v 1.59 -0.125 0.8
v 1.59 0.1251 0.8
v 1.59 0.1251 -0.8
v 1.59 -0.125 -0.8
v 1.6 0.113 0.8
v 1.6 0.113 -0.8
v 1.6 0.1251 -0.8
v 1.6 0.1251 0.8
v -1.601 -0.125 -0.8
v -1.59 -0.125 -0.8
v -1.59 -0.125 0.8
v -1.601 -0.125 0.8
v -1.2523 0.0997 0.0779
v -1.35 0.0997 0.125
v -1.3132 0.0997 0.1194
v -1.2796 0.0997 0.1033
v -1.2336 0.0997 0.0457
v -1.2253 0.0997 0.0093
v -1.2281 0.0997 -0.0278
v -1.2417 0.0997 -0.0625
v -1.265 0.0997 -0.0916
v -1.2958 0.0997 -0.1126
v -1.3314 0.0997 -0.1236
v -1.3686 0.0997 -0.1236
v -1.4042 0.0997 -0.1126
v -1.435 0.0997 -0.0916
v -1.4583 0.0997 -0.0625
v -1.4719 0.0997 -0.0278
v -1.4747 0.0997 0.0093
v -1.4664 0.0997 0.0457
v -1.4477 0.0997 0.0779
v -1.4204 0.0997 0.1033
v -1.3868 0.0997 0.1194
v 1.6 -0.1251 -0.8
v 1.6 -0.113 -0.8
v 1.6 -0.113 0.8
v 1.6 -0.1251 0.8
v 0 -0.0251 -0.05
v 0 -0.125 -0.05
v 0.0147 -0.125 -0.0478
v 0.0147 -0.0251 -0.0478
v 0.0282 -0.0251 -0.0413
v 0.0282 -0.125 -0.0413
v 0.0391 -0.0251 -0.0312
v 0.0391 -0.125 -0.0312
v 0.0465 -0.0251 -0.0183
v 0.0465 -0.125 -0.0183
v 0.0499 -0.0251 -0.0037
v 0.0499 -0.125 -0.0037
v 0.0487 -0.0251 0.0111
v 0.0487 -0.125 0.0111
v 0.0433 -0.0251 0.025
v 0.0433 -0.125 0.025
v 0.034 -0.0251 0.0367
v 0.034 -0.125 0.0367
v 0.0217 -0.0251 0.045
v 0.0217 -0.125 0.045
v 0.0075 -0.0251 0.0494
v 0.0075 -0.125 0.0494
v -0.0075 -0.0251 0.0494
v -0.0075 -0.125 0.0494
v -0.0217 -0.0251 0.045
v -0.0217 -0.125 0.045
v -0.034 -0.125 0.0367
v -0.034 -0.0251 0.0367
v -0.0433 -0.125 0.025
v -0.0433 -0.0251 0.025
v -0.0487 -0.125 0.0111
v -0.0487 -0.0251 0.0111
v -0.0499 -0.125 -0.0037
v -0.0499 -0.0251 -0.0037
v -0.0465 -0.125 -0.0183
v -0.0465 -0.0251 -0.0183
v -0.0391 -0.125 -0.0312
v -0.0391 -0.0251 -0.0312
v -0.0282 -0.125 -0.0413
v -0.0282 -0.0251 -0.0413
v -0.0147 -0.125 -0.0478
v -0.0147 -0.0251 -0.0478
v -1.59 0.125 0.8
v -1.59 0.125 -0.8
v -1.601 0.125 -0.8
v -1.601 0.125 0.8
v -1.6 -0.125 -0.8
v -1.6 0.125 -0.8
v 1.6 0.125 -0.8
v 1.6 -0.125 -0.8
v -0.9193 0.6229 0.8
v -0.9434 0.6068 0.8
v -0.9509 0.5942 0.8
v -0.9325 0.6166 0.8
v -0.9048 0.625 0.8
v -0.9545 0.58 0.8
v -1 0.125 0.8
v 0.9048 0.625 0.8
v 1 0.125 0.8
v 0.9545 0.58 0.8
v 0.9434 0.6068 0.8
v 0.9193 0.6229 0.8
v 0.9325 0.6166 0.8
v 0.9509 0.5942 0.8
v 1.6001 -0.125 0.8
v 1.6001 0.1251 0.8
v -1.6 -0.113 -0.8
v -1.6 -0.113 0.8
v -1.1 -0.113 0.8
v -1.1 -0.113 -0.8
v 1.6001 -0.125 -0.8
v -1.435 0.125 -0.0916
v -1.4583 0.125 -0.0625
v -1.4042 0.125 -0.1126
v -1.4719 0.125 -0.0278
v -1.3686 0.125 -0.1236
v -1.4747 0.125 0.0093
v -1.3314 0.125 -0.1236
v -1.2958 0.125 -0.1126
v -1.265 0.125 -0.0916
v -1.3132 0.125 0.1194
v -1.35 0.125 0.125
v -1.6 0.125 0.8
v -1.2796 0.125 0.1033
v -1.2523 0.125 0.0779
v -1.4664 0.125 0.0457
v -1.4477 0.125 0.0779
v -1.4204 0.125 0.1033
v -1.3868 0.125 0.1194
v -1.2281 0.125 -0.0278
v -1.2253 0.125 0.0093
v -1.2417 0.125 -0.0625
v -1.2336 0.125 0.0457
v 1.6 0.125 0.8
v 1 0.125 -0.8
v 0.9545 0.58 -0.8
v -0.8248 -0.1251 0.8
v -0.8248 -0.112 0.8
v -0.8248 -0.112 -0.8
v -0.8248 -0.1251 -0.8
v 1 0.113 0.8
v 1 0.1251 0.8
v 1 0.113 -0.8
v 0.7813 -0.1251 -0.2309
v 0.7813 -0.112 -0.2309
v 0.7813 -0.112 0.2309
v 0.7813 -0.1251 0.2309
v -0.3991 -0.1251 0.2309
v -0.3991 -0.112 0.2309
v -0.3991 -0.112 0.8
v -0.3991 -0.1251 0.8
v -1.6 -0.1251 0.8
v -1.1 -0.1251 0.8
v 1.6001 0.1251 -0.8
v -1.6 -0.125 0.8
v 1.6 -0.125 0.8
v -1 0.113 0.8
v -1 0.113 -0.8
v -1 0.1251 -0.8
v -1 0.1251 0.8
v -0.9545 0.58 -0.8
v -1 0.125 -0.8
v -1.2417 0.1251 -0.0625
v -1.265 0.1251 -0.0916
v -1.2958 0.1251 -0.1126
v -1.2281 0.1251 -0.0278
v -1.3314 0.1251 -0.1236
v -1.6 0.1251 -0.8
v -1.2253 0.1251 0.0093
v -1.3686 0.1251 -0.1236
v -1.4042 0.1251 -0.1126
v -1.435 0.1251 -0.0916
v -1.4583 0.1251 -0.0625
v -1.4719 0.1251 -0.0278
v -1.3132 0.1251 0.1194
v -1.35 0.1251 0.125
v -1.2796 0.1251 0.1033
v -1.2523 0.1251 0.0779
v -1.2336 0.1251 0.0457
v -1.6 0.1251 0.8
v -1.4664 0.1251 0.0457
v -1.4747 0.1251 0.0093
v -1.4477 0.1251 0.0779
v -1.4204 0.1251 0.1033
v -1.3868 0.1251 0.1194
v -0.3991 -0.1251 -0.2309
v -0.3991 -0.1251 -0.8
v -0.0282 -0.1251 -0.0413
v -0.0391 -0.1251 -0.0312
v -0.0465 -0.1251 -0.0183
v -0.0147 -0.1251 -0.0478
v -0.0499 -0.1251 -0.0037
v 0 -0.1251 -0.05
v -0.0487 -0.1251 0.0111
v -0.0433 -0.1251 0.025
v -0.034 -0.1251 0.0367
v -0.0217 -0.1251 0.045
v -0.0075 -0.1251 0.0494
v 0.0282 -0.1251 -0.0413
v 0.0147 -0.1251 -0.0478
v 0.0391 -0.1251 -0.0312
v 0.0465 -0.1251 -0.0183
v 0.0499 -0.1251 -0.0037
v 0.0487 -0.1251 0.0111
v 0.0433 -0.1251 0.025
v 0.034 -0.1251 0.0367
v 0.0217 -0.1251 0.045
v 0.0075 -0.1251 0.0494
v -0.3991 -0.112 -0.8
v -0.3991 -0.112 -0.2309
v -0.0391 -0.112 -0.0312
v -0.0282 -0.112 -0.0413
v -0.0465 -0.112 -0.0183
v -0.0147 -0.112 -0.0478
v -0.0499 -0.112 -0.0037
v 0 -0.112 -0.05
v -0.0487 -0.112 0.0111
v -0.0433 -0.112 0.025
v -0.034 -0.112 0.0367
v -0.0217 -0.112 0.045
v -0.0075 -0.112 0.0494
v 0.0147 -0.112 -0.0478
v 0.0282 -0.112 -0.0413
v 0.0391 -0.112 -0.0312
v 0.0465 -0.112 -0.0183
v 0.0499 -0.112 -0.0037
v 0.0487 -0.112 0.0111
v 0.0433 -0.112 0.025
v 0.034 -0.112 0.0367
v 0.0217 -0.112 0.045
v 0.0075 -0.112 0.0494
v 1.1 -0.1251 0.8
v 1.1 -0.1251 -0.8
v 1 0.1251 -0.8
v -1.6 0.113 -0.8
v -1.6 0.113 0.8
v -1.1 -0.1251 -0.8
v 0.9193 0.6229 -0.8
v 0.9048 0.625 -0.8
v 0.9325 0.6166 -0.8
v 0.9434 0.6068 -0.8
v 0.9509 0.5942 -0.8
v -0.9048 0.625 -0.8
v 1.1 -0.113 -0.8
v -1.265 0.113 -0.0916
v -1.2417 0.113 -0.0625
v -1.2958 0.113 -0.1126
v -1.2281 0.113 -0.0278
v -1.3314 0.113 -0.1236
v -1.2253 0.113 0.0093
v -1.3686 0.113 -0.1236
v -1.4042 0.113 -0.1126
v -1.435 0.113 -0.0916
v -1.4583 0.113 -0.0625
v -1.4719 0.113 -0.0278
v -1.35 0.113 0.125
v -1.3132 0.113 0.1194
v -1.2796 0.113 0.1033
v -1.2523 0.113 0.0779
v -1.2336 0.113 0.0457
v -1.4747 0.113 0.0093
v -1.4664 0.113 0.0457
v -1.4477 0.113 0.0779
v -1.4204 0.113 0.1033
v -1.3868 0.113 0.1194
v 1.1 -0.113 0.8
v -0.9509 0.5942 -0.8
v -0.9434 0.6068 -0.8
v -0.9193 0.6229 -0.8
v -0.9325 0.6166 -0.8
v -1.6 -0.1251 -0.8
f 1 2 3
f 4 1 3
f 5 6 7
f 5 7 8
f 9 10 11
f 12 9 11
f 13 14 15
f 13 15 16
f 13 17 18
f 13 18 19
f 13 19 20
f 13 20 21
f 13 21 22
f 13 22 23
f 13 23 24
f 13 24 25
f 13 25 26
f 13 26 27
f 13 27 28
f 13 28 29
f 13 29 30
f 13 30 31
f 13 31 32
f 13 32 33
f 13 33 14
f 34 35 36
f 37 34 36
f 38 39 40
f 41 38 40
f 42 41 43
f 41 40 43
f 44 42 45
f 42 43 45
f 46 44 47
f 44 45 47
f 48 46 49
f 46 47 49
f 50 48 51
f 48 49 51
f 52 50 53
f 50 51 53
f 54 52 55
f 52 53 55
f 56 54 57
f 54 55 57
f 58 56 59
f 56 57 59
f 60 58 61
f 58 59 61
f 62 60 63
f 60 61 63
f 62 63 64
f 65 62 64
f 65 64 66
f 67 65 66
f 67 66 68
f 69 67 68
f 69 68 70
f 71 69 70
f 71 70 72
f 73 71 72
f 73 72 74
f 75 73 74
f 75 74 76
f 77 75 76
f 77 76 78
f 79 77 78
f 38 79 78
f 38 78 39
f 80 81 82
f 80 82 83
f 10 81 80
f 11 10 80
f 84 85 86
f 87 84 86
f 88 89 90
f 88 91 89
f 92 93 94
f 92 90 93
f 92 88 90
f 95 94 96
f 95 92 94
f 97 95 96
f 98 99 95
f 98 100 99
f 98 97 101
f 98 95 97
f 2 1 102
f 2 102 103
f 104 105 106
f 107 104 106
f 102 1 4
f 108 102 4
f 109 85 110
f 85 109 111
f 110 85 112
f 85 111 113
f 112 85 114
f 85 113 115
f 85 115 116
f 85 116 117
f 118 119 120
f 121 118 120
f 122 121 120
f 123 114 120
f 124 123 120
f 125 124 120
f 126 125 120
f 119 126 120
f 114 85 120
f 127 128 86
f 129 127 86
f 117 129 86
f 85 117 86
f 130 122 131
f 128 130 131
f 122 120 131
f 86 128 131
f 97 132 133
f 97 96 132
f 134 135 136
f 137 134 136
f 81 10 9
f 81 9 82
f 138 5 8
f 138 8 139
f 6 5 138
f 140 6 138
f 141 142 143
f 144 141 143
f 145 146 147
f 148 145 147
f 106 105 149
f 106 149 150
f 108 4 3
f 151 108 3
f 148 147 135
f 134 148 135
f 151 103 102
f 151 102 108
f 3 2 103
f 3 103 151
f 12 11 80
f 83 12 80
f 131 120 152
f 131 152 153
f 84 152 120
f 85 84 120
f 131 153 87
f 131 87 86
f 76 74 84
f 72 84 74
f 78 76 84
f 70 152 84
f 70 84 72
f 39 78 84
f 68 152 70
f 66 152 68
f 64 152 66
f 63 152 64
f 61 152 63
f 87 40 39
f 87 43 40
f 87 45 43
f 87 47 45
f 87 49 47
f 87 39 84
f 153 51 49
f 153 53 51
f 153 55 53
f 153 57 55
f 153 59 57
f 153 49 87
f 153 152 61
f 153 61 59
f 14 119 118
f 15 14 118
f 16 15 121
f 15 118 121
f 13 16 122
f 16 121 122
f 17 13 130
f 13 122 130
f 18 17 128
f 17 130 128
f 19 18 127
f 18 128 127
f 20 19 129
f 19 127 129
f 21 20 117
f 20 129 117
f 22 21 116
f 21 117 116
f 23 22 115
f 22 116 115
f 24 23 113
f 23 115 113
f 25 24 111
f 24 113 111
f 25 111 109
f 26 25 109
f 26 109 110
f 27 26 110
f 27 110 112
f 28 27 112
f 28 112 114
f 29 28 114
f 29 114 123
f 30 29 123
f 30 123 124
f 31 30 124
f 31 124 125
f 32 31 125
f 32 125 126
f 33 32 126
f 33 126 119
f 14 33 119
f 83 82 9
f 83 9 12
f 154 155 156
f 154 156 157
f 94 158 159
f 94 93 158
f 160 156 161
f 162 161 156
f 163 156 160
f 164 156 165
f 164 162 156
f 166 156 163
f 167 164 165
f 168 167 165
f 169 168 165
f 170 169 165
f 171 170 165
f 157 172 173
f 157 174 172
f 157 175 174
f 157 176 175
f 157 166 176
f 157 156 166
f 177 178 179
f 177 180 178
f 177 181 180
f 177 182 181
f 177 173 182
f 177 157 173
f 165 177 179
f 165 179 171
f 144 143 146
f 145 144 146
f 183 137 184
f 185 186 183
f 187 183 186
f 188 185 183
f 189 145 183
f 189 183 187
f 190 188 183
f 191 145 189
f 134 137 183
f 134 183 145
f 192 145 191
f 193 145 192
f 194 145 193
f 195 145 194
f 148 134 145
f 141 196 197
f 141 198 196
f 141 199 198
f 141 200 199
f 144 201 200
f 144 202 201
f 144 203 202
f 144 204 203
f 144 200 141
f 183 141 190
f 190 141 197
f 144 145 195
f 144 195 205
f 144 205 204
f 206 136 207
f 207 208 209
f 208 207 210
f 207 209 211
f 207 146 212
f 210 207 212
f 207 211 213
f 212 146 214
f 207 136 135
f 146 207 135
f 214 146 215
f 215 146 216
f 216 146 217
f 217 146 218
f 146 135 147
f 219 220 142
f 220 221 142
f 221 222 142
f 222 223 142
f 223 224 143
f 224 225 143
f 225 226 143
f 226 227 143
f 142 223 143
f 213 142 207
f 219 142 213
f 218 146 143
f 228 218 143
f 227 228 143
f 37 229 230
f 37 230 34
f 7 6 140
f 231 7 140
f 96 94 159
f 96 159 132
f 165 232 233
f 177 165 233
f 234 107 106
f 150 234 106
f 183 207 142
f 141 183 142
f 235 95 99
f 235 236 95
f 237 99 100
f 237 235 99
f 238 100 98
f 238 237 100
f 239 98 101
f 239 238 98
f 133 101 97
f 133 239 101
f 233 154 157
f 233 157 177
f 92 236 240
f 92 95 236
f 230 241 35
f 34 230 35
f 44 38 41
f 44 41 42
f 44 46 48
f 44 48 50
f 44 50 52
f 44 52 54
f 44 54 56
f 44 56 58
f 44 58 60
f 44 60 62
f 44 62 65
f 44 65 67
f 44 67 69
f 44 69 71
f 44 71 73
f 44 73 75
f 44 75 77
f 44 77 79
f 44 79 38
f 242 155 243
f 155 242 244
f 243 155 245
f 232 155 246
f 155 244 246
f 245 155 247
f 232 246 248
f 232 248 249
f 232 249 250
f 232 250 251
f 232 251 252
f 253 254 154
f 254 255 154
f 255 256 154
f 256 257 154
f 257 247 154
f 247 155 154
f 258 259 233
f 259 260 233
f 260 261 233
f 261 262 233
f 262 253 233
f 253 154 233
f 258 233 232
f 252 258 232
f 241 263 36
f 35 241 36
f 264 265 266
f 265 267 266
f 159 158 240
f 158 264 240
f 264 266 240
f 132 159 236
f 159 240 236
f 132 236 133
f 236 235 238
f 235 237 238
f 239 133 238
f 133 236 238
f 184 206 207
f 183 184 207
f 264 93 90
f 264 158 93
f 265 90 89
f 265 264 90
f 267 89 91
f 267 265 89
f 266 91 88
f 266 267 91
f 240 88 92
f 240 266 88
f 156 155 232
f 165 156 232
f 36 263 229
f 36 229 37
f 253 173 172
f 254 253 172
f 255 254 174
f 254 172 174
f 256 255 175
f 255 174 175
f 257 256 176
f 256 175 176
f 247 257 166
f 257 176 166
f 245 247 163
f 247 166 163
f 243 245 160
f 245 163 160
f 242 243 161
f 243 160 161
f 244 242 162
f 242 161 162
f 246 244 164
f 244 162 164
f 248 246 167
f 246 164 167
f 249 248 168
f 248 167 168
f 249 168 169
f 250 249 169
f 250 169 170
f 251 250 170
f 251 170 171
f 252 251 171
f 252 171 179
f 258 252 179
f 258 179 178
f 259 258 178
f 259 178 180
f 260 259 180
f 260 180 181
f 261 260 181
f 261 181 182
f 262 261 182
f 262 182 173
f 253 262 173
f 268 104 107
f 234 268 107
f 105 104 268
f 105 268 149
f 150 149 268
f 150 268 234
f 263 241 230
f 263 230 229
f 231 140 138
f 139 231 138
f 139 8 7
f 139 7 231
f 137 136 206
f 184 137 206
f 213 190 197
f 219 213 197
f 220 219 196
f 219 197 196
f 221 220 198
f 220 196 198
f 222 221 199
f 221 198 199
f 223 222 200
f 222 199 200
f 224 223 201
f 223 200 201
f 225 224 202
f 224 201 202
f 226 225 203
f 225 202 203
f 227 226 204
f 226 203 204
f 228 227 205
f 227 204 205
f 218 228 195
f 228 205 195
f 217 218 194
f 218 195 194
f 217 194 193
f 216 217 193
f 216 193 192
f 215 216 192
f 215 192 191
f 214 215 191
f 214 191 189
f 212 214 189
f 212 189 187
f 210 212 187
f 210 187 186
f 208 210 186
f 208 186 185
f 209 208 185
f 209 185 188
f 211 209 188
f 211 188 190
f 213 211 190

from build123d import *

# Parameters (mm, degrees)
SKETCH1_W                  = 3.2
SKETCH1_H                  = 0.25
EXTRUDE1_DEPTH             = 0.8
EXTRUDE2_DEPTH             = 0.8
EXTRUDE3_START             = -0.013
EXTRUDE3_DEPTH             = 0.0131
EXTRUDE4_DEPTH             = 0.0001
EXTRUDE4_DEPTH_BACK        = 0.012
SKETCH2_3_W                = 0.5
SKETCH2_3_H                = 1.6
EXTRUDE4_2_DEPTH           = 0.0001
EXTRUDE4_2_DEPTH_BACK      = 0.012
EXTRUDE5_DEPTH             = 0.0001
EXTRUDE5_DEPTH_BACK        = 0.012
SKETCH3_W                  = 0.6
SKETCH3_H                  = 1.6
EXTRUDE5_2_DEPTH           = 0.0001
EXTRUDE5_2_DEPTH_BACK      = 0.012
FILLET1_R                  = 0.05
EXTRUDE6_DEPTH             = 0.0001
EXTRUDE6_DEPTH_BACK        = 0.01
SKETCH5_W                  = 1.6
SKETCH5_H                  = 0.2501
EXTRUDE7_DEPTH             = 0.001
EXTRUDE7_DEPTH_BACK        = 0.01
SKETCH6_W                  = 1.6
SKETCH6_H                  = 0.25
SKETCH8_R                  = 0.05
EXTRUDE_PWB_LOCATION_DEPTH = 0.1
SKETCH9_R                  = 0.125
CUT_EXTRUDE2_DEPTH         = 0.0254


# Read off the part's stored shape, not the designer's step: Extrude3
with BuildPart() as part:
    # Sketch1 → Extrude1 (new, symmetric)
    with BuildSketch(Plane.XY):
        Rectangle(SKETCH1_W, SKETCH1_H)
    extrude(amount=EXTRUDE1_DEPTH, both=True)


with BuildPart() as body_2:
    # Sketch1<3> → Extrude2 (new, symmetric)
    with BuildSketch(Plane.XY):
        Polygon((-0.95, 0.625), (-1, 0.125), (1, 0.125), (0.95, 0.625), align=None)
    extrude(amount=EXTRUDE2_DEPTH, both=True)

    # Fillet1
    fillet1_edges = [body_2.edges().sort_by_distance(p)[0] for p in [
        (0.95, 0.625, 0),
        (-0.95, 0.625, 0),
    ]]
    fillet(fillet1_edges, radius=FILLET1_R)


with BuildPart() as body_3:
    # Extrude3 outline → Extrude3 (new body)
    with BuildSketch(Plane.XZ.offset(0.125).offset(EXTRUDE3_START)):
        Polygon((-0.399092971, 0.230883574), (-0.399092971, 0.8), (-0.824792139, 0.8), (-0.824792139, -0.8), (-0.399092971, -0.8), (-0.399092971, -0.230883574), (0.781254724, -0.230883574), (0.781254724, 0.230883574), align=None)
    extrude(amount=EXTRUDE3_DEPTH)


with BuildPart() as body_4:
    # Sketch2<3> → Extrude4 (new, two sides: drawn at the far end of the back side and taken through both)
    with BuildSketch(Plane.XZ.offset(0.125).offset(-EXTRUDE4_DEPTH_BACK)):
        with Locations((-1.35, 0)):
            Rectangle(SKETCH2_3_W, SKETCH2_3_H)
    extrude(amount=EXTRUDE4_DEPTH + EXTRUDE4_DEPTH_BACK)


with BuildPart() as body_5:
    # Sketch2<3> → Extrude4 2 (new, two sides: drawn at the far end of the back side and taken through both)
    with BuildSketch(Plane.XZ.offset(0.125).offset(-EXTRUDE4_2_DEPTH_BACK)):
        with Locations((1.35, 0)):
            Rectangle(SKETCH2_3_W, SKETCH2_3_H)
    extrude(amount=EXTRUDE4_2_DEPTH + EXTRUDE4_2_DEPTH_BACK)


with BuildPart() as body_6:
    # Sketch3 → Extrude5 (new, two sides: drawn at the far end of the back side and taken through both)
    with BuildSketch(Plane(origin=(0, 0.125, 0), x_dir=(-1, 0, 0), z_dir=(0, 1, 0)).offset(-EXTRUDE5_DEPTH_BACK)):
        with Locations((1.3, 0)):
            Rectangle(SKETCH3_W, SKETCH3_H)
    extrude(amount=EXTRUDE5_DEPTH + EXTRUDE5_DEPTH_BACK)


with BuildPart() as body_7:
    # Sketch3 → Extrude5 2 (new, two sides: drawn at the far end of the back side and taken through both)
    with BuildSketch(Plane(origin=(0, 0.125, 0), x_dir=(-1, 0, 0), z_dir=(0, 1, 0)).offset(-EXTRUDE5_2_DEPTH_BACK)):
        with Locations((-1.3, 0)):
            Rectangle(SKETCH3_W, SKETCH3_H)
    extrude(amount=EXTRUDE5_2_DEPTH + EXTRUDE5_2_DEPTH_BACK)


with BuildPart() as body_8:
    # Sketch5 → Extrude6 (new, two sides: drawn at the far end of the back side and taken through both)
    with BuildSketch(Plane(origin=(1.6, 0, 0), x_dir=(0, 0, -1), z_dir=(1, 0, 0)).offset(-EXTRUDE6_DEPTH_BACK)):
        with Locations((0, 5e-05)):
            Rectangle(SKETCH5_W, SKETCH5_H)
    extrude(amount=EXTRUDE6_DEPTH + EXTRUDE6_DEPTH_BACK)


with BuildPart() as body_9:
    # Sketch6 → Extrude7 (new, two sides: drawn at the far end of the back side and taken through both)
    with BuildSketch(Plane.ZY.offset(1.6).offset(-EXTRUDE7_DEPTH_BACK)):
        Rectangle(SKETCH6_W, SKETCH6_H)
    extrude(amount=EXTRUDE7_DEPTH + EXTRUDE7_DEPTH_BACK)


with BuildPart() as extrude_pwb_location_tool:
    # Sketch8 → Extrude PWB Location (new body)
    with BuildSketch(Plane.XZ.offset(0.1251)):
        with Locations(Location((0, 0, 0), (0, 0, 270))):
            Circle(SKETCH8_R)
    extrude(amount=-EXTRUDE_PWB_LOCATION_DEPTH)


with BuildPart() as part_1:
    add(part.part)

    # Extrude PWB Location: cut by extrude_pwb_location_tool
    add(extrude_pwb_location_tool.part, mode=Mode.SUBTRACT)


with BuildPart() as body_3_1:
    add(body_3.part)

    # Extrude PWB Location: cut by extrude_pwb_location_tool
    add(extrude_pwb_location_tool.part, mode=Mode.SUBTRACT)


with BuildPart() as cut_extrude2_tool:
    # Sketch9 → Cut-Extrude2 (new body)
    with BuildSketch(Plane(origin=(0, 0.1251, 0), x_dir=(1, 0, 0), z_dir=(0, 1, 0))):
        with Locations(Location((-1.35, 0, 0), (0, 0, 270))):
            Circle(SKETCH9_R)
    extrude(amount=-CUT_EXTRUDE2_DEPTH)


with BuildPart() as part_2:
    add(part_1.part)

    # Cut-Extrude2: cut by cut_extrude2_tool
    add(cut_extrude2_tool.part, mode=Mode.SUBTRACT)


with BuildPart() as body_6_1:
    add(body_6.part)

    # Cut-Extrude2: cut by cut_extrude2_tool
    add(cut_extrude2_tool.part, mode=Mode.SUBTRACT)


solid = Compound([body_2.part, body_4.part, body_5.part, body_7.part, body_8.part, body_9.part, body_3_1.part, part_2.part, body_6_1.part])
